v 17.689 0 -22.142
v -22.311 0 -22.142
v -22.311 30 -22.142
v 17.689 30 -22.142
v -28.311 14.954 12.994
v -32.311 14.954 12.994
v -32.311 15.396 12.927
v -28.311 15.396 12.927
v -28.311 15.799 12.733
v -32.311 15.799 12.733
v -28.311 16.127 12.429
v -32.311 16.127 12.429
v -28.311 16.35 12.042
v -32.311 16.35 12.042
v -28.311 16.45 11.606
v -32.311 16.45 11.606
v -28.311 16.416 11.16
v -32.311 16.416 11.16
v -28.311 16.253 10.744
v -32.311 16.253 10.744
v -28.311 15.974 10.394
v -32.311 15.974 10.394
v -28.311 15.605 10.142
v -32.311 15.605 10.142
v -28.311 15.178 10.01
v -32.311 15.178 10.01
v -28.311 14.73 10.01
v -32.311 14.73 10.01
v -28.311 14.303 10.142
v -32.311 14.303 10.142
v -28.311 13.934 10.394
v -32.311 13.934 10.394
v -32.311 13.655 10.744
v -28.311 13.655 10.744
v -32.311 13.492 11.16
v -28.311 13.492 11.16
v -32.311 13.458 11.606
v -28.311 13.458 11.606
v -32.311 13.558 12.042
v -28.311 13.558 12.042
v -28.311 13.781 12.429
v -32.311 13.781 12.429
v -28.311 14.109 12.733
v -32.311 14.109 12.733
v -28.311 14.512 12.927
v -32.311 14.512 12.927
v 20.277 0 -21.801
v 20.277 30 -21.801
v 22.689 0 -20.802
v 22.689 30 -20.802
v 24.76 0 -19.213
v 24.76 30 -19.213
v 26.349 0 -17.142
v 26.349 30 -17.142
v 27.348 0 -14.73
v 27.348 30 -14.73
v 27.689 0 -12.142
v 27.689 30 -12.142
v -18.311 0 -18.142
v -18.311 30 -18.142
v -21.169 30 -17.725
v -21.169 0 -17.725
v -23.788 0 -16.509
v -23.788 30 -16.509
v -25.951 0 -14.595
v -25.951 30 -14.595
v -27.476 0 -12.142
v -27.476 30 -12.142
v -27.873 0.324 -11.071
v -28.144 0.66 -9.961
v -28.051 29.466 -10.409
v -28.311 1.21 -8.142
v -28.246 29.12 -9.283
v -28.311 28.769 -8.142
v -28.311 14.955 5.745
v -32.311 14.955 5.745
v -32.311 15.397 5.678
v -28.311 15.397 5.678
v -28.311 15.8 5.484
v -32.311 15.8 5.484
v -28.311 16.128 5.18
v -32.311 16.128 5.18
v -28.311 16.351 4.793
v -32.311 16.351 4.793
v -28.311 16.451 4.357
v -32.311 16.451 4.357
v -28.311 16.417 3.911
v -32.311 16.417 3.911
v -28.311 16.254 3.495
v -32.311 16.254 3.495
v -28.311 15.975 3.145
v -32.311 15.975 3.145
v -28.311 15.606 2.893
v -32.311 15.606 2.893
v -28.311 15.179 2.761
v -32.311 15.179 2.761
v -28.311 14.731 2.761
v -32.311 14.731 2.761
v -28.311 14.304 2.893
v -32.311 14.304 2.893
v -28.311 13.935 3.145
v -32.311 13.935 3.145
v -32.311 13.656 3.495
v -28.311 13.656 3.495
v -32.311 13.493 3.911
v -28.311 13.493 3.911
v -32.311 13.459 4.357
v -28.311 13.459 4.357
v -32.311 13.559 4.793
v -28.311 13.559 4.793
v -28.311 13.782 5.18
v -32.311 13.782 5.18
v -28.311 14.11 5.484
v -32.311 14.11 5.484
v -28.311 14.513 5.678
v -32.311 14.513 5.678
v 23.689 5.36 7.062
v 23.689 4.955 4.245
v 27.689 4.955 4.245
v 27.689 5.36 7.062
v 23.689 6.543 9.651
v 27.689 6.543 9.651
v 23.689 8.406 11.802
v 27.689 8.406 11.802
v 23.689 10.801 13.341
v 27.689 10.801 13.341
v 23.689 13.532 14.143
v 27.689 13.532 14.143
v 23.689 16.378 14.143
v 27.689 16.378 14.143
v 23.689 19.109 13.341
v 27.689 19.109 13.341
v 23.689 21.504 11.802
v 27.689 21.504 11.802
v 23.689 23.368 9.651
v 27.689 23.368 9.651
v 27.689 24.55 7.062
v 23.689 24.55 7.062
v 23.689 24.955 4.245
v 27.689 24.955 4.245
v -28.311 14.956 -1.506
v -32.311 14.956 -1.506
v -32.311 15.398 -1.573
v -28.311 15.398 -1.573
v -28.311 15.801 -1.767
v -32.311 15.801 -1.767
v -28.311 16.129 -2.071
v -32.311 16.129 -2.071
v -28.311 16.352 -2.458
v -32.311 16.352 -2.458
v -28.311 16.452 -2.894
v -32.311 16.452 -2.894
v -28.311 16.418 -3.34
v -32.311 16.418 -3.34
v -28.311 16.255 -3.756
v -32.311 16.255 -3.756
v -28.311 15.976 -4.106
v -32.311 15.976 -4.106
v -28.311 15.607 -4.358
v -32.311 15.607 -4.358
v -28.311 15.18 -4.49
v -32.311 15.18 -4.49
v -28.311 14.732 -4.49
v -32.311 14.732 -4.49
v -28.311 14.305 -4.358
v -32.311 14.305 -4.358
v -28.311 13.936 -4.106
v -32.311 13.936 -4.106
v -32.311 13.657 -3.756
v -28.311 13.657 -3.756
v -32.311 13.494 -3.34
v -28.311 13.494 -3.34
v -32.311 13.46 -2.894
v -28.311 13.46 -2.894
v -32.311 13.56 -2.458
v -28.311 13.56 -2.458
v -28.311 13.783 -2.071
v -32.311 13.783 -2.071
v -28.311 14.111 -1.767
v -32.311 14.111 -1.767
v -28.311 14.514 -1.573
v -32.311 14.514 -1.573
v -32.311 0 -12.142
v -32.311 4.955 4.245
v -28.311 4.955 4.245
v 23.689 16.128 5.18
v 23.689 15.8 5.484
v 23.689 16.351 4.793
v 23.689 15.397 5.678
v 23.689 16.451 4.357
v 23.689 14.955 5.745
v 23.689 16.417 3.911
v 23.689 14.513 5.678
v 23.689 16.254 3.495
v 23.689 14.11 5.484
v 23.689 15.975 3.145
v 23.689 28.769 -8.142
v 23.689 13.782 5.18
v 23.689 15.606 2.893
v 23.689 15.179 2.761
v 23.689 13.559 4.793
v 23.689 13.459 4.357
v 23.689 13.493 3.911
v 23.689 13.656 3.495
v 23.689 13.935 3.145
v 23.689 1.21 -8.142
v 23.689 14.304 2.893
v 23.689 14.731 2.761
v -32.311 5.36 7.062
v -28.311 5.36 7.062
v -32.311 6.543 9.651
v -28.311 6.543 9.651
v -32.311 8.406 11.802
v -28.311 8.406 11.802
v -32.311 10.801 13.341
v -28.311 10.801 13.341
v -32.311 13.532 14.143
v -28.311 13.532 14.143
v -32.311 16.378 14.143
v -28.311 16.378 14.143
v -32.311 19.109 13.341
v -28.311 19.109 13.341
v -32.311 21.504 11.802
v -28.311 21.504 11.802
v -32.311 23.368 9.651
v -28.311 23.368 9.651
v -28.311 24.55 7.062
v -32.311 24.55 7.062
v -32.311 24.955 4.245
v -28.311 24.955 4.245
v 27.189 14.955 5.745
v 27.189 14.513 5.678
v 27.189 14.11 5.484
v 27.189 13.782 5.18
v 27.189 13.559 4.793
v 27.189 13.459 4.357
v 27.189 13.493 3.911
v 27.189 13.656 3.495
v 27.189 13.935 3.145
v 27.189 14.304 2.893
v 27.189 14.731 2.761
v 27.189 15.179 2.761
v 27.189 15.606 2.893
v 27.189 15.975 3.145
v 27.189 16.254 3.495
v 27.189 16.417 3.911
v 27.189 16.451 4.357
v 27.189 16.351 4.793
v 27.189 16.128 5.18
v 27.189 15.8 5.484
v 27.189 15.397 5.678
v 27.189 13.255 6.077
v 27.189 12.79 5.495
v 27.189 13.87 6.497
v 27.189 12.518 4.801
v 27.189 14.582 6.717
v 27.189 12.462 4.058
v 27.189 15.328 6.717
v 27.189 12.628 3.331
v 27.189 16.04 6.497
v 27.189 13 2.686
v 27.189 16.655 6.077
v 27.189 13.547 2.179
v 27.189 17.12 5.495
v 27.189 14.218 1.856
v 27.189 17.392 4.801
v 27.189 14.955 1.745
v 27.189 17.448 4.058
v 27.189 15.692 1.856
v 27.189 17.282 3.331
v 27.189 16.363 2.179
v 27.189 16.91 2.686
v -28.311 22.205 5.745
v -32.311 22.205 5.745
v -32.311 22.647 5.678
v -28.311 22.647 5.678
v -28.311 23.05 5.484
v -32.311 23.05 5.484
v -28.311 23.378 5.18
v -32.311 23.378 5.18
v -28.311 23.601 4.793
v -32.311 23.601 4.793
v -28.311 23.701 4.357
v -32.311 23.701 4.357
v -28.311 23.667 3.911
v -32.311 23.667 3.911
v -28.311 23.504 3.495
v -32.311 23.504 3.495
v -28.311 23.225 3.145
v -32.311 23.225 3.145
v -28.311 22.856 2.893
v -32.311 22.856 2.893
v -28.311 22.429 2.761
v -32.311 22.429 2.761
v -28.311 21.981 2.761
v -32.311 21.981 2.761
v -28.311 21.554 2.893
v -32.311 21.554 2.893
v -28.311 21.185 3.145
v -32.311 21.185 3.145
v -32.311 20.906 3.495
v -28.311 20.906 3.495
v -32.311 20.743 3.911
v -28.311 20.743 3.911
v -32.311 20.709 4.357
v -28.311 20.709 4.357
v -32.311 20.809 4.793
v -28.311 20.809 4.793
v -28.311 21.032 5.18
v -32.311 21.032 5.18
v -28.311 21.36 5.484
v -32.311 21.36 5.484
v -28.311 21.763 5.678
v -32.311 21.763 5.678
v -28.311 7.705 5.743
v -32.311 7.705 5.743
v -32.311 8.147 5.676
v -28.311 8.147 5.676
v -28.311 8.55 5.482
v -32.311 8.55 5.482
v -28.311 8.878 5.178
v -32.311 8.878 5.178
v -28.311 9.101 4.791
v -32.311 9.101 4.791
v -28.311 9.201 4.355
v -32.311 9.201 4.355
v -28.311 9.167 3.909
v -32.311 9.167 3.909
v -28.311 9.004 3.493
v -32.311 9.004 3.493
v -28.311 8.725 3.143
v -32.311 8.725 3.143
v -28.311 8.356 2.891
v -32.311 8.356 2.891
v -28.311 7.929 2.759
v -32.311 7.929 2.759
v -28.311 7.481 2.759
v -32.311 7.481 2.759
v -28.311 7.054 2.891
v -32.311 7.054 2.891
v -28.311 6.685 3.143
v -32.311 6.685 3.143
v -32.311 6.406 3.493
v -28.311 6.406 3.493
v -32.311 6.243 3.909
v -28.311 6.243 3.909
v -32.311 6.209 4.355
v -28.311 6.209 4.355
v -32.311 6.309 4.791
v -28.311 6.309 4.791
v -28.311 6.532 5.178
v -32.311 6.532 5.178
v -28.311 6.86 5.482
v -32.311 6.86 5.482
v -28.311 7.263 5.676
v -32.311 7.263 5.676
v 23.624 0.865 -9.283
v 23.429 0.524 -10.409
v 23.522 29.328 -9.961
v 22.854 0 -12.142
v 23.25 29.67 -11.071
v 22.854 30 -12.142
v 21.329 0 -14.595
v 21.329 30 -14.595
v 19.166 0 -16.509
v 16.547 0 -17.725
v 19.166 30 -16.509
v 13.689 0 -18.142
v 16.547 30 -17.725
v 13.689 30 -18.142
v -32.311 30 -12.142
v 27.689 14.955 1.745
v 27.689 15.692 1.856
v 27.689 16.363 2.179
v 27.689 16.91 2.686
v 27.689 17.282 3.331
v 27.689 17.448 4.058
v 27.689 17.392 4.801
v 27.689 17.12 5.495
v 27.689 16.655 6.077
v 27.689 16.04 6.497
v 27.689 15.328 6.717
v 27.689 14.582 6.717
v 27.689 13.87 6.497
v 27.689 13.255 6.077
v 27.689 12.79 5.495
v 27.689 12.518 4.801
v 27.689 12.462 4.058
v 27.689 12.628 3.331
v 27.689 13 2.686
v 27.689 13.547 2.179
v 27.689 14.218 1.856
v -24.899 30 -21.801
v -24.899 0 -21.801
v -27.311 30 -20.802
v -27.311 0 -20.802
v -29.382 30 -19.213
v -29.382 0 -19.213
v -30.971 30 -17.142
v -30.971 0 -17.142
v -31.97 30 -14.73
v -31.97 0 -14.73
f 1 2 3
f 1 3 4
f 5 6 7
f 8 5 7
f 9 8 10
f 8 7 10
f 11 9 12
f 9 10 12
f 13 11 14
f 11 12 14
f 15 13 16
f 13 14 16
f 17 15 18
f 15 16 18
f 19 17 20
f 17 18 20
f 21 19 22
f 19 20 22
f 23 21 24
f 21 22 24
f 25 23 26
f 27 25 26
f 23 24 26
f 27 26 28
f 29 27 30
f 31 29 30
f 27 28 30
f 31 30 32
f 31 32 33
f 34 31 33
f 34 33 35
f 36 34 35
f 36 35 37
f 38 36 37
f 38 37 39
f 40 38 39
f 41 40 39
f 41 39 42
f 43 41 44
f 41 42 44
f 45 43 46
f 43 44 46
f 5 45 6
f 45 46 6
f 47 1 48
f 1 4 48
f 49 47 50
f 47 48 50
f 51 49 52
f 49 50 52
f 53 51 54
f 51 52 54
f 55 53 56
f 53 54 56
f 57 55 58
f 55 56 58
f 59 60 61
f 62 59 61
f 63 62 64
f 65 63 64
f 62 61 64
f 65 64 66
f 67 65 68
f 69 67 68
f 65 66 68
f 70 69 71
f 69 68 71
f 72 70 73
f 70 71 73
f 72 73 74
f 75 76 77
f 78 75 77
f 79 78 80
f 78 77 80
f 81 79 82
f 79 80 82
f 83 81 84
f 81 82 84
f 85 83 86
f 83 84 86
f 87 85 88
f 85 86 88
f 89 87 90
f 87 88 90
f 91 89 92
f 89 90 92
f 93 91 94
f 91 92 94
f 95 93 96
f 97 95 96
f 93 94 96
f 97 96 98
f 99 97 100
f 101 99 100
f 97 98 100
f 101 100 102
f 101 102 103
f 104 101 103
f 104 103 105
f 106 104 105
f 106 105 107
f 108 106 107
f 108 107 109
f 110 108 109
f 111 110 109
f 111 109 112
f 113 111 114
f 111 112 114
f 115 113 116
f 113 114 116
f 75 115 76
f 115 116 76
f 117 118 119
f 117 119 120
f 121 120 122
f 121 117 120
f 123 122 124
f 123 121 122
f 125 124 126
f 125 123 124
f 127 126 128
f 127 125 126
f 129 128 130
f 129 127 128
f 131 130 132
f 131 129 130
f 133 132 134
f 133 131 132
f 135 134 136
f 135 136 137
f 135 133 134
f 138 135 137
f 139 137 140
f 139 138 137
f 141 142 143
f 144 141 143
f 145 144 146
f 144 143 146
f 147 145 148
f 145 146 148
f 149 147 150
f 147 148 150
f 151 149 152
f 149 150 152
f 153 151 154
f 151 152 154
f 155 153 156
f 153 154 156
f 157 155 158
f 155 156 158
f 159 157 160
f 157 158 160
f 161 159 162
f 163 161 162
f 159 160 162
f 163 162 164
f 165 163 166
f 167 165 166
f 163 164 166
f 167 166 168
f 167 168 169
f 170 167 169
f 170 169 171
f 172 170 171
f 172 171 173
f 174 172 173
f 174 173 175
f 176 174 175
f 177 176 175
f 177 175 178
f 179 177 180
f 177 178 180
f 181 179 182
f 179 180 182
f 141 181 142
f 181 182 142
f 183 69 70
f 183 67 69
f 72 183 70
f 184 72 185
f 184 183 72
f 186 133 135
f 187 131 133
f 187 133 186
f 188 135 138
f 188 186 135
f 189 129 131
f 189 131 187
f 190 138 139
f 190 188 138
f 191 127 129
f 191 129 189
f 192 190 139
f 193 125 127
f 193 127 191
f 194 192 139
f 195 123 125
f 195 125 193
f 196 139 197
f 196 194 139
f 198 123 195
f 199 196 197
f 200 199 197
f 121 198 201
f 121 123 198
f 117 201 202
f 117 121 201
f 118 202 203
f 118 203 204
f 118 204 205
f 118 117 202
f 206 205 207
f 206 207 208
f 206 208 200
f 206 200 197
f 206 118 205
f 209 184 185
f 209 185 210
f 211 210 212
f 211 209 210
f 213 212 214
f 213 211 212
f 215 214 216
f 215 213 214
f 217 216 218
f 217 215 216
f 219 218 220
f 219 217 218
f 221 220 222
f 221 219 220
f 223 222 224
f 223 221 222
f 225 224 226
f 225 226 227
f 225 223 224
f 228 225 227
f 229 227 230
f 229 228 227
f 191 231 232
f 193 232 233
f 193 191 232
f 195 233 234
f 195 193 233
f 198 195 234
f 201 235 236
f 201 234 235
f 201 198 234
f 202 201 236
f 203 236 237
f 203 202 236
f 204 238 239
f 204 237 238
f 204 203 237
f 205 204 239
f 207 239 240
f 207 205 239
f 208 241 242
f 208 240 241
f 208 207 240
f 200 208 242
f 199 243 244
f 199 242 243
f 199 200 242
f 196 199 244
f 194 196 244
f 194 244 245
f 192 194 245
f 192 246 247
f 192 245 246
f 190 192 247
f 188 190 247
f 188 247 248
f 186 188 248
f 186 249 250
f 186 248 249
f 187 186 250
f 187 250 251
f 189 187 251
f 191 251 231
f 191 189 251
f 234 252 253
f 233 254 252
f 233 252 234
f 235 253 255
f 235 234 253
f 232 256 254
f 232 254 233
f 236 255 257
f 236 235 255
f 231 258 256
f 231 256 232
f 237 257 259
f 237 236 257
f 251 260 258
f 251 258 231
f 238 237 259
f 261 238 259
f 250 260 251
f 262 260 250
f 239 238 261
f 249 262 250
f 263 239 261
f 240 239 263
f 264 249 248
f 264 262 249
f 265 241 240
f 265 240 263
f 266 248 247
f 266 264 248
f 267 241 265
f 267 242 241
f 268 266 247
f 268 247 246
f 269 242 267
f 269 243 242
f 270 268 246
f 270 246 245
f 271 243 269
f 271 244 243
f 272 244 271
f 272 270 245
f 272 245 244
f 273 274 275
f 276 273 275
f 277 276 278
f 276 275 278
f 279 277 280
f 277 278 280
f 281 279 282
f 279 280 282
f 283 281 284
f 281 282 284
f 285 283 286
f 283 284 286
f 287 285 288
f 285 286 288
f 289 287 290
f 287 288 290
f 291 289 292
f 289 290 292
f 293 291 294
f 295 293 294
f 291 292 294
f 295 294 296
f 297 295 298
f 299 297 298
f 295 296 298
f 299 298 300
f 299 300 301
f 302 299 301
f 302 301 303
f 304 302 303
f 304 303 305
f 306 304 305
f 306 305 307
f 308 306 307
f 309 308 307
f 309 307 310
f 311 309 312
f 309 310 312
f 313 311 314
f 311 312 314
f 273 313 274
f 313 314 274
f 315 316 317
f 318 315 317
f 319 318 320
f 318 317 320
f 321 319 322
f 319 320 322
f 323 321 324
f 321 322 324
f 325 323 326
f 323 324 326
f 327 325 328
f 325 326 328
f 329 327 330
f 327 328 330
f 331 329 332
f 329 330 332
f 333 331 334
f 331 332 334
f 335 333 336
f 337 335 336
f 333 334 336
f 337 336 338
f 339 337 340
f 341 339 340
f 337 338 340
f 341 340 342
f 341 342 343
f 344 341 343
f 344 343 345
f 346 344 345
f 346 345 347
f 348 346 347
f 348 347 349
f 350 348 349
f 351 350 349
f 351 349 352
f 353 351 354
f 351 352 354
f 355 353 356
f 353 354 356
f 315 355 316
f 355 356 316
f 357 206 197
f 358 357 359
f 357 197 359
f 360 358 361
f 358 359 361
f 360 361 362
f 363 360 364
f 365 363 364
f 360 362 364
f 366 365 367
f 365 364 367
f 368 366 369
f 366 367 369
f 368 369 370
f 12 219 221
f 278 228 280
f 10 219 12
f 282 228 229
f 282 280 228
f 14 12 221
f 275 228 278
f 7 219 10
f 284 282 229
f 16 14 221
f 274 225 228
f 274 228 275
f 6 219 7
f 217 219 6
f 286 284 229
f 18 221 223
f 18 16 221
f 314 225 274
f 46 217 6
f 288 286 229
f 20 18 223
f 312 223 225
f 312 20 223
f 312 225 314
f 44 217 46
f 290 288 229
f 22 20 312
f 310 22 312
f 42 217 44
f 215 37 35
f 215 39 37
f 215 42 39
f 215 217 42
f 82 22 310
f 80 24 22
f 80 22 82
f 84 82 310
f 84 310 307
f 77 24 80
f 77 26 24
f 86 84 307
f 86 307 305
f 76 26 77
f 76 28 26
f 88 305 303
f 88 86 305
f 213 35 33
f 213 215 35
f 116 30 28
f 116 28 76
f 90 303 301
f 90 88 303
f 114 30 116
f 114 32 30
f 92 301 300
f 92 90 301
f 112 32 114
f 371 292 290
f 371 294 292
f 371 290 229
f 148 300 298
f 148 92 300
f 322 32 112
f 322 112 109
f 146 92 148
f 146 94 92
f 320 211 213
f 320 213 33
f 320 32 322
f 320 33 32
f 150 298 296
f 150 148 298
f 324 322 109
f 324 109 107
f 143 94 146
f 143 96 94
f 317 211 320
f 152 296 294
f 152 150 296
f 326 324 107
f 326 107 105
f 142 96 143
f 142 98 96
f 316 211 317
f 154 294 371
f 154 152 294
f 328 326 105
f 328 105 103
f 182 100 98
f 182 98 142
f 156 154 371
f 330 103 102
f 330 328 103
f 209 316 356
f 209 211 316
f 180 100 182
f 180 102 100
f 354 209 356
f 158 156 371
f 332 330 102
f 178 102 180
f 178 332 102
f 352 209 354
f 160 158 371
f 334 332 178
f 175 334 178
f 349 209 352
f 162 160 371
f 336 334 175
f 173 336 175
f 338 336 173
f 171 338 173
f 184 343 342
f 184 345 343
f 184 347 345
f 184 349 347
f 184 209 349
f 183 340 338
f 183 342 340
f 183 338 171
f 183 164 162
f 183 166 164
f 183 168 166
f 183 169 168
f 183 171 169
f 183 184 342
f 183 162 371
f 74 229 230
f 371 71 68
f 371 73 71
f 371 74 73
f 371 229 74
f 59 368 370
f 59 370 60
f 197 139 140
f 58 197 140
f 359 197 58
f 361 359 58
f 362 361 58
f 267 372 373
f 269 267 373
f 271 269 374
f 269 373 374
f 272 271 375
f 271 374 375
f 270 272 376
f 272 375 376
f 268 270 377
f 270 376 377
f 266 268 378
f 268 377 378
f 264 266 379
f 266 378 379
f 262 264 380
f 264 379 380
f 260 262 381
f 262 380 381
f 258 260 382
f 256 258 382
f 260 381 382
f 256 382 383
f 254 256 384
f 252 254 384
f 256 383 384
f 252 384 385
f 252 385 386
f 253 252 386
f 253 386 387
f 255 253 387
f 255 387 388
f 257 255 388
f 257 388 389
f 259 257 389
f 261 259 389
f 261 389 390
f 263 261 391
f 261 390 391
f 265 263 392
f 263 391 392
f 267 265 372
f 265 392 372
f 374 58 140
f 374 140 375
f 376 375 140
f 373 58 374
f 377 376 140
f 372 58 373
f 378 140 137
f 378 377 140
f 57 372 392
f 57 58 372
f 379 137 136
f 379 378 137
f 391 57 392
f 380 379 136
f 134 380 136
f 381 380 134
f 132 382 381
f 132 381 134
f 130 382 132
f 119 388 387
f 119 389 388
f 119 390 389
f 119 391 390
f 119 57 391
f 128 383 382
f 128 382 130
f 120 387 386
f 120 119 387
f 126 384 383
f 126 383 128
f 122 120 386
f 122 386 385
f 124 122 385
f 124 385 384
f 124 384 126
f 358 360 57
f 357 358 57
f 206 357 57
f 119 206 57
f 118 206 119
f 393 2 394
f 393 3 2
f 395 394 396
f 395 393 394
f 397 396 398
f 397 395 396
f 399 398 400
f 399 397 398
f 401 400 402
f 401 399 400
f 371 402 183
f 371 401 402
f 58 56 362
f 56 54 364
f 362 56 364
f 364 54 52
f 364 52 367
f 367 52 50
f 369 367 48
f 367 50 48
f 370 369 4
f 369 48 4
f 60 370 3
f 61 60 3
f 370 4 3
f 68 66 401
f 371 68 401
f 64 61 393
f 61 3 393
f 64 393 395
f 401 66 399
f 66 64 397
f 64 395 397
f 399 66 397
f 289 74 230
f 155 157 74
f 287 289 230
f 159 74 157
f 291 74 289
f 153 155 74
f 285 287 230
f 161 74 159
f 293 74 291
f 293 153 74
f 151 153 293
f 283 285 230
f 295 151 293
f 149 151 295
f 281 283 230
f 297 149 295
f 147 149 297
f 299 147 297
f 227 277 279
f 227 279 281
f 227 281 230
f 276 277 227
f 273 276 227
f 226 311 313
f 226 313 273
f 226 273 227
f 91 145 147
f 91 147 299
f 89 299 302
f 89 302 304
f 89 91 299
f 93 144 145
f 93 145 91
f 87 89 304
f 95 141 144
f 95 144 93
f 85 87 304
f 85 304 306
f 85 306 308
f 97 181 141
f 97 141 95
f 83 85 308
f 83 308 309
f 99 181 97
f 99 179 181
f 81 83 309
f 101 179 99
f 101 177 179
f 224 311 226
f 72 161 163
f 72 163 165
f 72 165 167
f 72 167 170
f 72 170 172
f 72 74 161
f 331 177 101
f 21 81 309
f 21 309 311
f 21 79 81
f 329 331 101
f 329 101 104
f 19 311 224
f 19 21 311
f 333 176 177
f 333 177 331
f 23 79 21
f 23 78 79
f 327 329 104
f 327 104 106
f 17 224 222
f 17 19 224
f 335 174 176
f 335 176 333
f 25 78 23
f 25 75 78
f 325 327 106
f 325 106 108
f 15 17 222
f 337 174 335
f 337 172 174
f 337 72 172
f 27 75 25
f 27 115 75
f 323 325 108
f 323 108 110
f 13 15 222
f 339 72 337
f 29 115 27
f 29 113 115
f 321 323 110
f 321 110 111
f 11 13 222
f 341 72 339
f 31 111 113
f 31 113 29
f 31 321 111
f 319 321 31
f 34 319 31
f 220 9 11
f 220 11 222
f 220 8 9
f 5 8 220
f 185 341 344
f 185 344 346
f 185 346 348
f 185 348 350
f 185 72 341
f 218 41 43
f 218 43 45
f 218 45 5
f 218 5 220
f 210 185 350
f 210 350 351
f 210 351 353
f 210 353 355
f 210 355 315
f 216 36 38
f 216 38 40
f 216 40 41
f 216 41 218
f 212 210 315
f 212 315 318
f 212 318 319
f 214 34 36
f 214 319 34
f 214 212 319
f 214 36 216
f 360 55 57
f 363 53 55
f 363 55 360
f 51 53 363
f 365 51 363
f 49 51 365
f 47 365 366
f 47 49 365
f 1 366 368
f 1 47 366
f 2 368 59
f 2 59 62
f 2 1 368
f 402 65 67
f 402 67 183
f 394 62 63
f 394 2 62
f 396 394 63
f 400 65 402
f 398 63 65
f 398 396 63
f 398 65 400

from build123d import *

# Parameters (mm, degrees)
EXTRUDE_1_DEPTH     = 30
FILLET_1_R          = 10
FILLET_2_R          = 10
SKETCH_4_R          = 1.5
CUT_EXTRUDE_1_DEPTH = 4
CUT_EXTRUDE_2_DEPTH = 71.641899783
CUT_EXTRUDE_START   = -4
SKETCH_6_R          = 1.5
CUT_EXTRUDE_3_DEPTH = 4
SKETCH_7_R          = 2.5
CUT_EXTRUDE_4_DEPTH = 0.5


with BuildPart() as part:
    # 草图2 → 凸台-拉伸1 (new body)
    with BuildSketch(Plane(origin=(0, 0, 0), x_dir=(1, 0, 0), z_dir=(0, 1, 0))):
        Polygon((23.688888889, -16.857777778), (23.688888889, 18.142222222), (-28.311111111, 18.142222222), (-28.311111111, -16.857777778), (-32.311111111, -16.857777778), (-32.311111111, 22.142222222), (27.688888889, 22.142222222), (27.688888889, -16.857777778), align=None)
    extrude(amount=EXTRUDE_1_DEPTH)

    # 圆角1
    fillet_1_edges = [part.edges().sort_by_distance(p)[0] for p in [
        (23.688888889, 15, -18.142222222),
        (27.688888889, 15, -22.142222222),
    ]]
    fillet(fillet_1_edges, radius=FILLET_1_R)

    # 圆角2
    fillet_2_edges = [part.edges().sort_by_distance(p)[0] for p in [
        (-28.311111111, 15, -18.142222222),
        (-32.311111111, 15, -22.142222222),
    ]]
    fillet(fillet_2_edges, radius=FILLET_2_R)

    # 草图4 → 切除-拉伸1 (cut)
    with BuildSketch(Plane.ZY.offset(32.311111111)):
        with Locations((-3.006286177, 14.956055529)):
            Circle(SKETCH_4_R)
        with Locations((11.493713823, 14.954055529)):
            Circle(SKETCH_4_R)
        with Locations((4.244713823, 22.205055529)):
            Circle(SKETCH_4_R)
        with Locations((4.242713823, 7.705055529)):
            Circle(SKETCH_4_R)
        with Locations((4.244713823, 14.955055529)):
            Circle(SKETCH_4_R)
    extrude(amount=-CUT_EXTRUDE_1_DEPTH, mode=Mode.SUBTRACT)

    # 草图5 → 切除-拉伸2 (cut, through all)
    with BuildSketch(Plane.ZY.offset(32.311111111)):
        with BuildLine():
            Line((16.857777778, 0), (4.244713823, 0))
            Line((4.244713823, 0), (-12.142222222, 0))
            Line((-12.142222222, 0), (4.244713823, 4.955055529))
            ThreePointArc((4.244713823, 4.955055529), (14.244713823, 14.955055529), (4.244713823, 24.955055529))
            Line((4.244713823, 24.955055529), (-12.142222222, 30))
            Line((-12.142222222, 30), (4.244713823, 30))
            Line((4.244713823, 30), (16.857777778, 30))
            Line((16.857777778, 30), (16.857777778, 0))
        make_face()
    extrude(amount=-CUT_EXTRUDE_2_DEPTH, mode=Mode.SUBTRACT)

    # 草图6 → 切除-拉伸3 (cut)
    with BuildSketch(Plane(origin=(27.688888889, 0, 0), x_dir=(0, 0, -1), z_dir=(1, 0, 0)).offset(CUT_EXTRUDE_START)):
        with Locations(Location((-4.244713823, 14.955055529, 0), (0, 0, 180))):
            Circle(SKETCH_6_R)
    extrude(amount=CUT_EXTRUDE_3_DEPTH, mode=Mode.SUBTRACT)

    # 草图7 → 切除-拉伸4 (cut)
    with BuildSketch(Plane(origin=(27.688888889, 0, 0), x_dir=(0, 0, -1), z_dir=(1, 0, 0))):
        with Locations((-4.244713823, 14.955055529)):
            Circle(SKETCH_7_R)
    extrude(amount=-CUT_EXTRUDE_4_DEPTH, mode=Mode.SUBTRACT)


solid = part.part
